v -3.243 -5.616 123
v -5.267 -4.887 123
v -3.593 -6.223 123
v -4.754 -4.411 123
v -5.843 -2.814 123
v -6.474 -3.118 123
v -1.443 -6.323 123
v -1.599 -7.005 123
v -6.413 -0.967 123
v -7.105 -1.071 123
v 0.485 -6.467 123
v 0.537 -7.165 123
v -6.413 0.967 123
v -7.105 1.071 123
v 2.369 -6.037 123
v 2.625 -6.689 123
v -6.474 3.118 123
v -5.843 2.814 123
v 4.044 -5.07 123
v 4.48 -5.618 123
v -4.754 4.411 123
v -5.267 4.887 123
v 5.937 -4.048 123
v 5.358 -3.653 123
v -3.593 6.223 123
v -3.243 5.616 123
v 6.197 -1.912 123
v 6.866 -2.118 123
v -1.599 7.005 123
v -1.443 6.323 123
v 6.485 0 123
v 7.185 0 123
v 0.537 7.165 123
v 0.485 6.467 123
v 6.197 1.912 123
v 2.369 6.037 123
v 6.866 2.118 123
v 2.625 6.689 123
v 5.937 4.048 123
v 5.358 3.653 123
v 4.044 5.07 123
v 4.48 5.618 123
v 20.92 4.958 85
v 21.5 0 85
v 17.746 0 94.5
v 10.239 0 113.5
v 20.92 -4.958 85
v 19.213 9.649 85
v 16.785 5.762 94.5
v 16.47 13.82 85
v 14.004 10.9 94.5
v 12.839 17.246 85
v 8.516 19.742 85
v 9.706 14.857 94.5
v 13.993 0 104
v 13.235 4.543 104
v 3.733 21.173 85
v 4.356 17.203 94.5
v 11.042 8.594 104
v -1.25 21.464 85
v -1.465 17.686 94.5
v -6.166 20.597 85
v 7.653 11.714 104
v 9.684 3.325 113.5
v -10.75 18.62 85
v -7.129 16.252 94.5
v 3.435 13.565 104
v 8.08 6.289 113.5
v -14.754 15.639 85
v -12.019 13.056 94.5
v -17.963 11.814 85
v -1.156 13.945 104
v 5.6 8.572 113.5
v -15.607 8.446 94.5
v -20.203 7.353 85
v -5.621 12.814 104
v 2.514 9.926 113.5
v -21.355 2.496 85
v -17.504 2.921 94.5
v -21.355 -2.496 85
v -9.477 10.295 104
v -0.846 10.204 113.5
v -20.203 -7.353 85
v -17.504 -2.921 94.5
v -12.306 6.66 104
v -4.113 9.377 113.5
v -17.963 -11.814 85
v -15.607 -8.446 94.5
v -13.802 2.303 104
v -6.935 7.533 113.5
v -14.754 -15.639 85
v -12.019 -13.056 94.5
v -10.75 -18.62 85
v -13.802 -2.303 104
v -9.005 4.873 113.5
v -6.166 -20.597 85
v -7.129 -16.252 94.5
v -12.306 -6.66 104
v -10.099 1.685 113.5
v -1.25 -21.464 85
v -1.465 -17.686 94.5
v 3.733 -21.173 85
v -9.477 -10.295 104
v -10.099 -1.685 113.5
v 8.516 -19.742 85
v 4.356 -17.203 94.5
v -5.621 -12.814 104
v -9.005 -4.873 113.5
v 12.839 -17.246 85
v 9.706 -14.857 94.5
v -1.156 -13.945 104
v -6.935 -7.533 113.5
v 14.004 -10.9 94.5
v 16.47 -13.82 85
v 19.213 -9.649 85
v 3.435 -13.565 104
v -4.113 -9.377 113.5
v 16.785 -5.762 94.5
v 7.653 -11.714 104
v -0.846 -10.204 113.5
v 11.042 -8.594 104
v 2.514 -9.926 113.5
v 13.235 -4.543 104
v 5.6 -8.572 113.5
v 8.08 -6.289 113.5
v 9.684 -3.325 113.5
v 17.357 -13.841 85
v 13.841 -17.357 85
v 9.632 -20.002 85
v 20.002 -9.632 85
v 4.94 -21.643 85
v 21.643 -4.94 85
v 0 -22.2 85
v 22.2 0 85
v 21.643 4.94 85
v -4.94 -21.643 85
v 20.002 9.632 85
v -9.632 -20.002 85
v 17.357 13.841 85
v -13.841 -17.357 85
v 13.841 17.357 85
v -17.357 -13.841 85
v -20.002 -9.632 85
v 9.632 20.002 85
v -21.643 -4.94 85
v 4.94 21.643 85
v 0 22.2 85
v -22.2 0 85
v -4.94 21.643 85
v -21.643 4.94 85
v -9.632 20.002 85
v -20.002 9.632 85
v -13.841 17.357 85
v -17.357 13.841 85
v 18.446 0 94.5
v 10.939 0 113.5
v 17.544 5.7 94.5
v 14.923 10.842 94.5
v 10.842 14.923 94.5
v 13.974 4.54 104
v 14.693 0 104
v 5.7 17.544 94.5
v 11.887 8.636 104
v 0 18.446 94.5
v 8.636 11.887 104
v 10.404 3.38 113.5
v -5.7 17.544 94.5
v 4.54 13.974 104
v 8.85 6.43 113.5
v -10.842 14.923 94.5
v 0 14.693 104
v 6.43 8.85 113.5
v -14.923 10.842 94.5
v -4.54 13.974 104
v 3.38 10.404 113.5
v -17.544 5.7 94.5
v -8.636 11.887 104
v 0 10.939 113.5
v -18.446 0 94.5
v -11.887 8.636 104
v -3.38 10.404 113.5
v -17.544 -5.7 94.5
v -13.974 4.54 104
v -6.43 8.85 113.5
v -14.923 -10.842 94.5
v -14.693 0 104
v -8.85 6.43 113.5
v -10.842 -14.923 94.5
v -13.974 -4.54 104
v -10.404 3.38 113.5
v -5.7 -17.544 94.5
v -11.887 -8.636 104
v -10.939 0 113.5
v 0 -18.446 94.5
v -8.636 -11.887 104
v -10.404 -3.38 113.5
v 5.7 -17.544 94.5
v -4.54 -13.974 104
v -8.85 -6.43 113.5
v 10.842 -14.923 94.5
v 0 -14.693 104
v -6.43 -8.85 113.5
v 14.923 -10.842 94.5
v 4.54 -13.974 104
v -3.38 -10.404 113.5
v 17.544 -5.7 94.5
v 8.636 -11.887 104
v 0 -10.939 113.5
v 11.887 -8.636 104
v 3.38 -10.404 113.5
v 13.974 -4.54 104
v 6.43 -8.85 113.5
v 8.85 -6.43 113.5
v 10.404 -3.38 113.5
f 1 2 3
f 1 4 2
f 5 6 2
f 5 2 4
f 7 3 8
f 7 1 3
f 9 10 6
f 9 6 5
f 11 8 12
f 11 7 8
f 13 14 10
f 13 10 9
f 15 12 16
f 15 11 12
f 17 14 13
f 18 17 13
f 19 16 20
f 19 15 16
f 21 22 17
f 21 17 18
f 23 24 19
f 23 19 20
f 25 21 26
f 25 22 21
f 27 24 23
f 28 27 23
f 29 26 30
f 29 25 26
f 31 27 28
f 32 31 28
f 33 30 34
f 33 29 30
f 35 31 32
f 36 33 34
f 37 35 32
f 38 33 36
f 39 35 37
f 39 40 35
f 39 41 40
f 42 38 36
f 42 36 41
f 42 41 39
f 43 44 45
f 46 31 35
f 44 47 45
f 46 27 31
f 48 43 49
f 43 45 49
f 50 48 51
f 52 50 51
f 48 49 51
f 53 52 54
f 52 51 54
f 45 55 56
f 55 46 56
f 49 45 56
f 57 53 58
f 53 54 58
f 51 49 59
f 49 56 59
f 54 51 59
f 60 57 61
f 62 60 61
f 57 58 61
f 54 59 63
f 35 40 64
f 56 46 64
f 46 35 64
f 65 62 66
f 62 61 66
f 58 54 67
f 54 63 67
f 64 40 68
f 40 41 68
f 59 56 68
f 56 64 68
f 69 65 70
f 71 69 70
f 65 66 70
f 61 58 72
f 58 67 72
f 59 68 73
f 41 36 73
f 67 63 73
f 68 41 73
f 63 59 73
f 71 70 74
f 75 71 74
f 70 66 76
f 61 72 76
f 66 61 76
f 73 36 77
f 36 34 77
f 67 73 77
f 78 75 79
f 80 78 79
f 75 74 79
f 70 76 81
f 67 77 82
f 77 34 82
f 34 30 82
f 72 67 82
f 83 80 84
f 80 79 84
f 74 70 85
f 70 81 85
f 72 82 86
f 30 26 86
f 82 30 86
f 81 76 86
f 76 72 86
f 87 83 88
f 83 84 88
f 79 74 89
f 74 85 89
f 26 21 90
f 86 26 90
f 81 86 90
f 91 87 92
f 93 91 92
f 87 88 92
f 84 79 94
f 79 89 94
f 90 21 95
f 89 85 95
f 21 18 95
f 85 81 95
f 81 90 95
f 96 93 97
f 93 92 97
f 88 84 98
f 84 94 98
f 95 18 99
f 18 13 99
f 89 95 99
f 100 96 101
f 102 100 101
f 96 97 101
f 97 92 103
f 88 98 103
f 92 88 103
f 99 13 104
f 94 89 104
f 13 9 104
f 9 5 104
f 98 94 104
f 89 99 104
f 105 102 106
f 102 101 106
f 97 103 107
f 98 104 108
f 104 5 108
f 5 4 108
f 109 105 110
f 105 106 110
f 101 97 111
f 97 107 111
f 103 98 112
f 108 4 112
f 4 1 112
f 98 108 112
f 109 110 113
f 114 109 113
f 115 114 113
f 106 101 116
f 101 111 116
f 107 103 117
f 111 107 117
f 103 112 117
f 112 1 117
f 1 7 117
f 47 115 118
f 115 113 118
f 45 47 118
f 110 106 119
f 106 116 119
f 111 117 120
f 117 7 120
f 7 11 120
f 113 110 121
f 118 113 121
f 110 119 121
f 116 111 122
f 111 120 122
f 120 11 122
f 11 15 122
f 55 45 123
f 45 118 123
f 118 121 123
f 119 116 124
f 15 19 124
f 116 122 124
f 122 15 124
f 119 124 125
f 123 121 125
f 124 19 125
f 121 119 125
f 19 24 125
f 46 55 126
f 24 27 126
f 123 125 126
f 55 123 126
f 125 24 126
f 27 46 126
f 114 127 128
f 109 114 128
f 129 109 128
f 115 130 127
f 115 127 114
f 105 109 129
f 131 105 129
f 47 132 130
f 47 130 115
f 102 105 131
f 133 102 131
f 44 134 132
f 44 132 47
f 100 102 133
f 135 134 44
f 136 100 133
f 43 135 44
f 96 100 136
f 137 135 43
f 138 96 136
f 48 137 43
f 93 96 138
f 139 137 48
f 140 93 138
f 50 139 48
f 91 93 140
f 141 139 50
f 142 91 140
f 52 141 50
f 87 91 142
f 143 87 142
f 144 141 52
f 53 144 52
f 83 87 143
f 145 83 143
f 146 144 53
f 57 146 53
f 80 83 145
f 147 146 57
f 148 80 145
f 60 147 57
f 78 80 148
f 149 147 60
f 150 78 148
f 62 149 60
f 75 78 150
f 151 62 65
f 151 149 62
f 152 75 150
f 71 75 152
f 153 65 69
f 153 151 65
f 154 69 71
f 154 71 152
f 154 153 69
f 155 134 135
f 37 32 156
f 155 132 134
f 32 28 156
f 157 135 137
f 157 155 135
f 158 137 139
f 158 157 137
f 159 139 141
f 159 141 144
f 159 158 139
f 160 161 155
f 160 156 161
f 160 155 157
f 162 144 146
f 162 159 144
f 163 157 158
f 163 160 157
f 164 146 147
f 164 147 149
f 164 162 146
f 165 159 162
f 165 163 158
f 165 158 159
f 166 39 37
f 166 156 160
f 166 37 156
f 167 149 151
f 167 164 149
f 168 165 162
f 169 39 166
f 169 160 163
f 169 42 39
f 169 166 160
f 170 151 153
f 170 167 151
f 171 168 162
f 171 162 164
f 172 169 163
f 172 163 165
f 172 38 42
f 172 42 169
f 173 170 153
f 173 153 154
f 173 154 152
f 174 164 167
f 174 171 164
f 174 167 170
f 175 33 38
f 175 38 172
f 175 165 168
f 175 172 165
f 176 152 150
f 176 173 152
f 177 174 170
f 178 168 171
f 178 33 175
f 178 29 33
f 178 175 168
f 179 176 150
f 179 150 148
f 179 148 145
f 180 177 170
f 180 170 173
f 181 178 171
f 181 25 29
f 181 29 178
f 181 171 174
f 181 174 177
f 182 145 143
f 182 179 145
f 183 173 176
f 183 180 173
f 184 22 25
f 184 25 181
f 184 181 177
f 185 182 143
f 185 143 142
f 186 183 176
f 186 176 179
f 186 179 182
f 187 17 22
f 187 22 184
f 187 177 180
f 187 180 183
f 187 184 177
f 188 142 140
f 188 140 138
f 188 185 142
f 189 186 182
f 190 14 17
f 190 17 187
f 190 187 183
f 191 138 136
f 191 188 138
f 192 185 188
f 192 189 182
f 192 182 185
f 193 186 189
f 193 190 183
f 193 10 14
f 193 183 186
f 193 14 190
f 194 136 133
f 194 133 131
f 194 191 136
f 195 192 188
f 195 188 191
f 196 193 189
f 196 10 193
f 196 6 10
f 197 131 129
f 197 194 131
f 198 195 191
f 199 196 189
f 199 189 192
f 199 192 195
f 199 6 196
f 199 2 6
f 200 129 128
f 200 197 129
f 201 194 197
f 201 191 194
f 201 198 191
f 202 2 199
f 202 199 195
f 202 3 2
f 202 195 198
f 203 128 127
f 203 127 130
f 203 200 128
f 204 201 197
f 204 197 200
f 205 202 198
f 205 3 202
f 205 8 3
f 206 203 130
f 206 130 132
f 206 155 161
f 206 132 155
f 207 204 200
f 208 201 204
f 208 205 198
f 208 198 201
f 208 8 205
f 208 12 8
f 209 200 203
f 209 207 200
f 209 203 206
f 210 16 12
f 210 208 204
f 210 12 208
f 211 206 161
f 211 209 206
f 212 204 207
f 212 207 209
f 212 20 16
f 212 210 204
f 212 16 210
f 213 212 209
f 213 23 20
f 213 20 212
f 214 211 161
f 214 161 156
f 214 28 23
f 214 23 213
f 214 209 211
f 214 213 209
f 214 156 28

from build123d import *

# Parameters (mm, degrees)
CYLINDER044_R     = 8
CYLINDER044_DEPTH = 3


with BuildPart() as cylinder044:
    # Cylinder044 → Cylinder044 (new body)
    with BuildSketch(Plane.XY.offset(123)):
        Circle(CYLINDER044_R)
    extrude(amount=CYLINDER044_DEPTH)


with BuildPart() as cone001:
    # Cone002 → Cone002 (revolve)
    with BuildSketch(Plane(origin=(0, 0, 75), x_dir=(1, 0, 0), z_dir=(0, -1, 0))):
        Polygon((0, 0), (21.5, 0), (5.3, 41), (0, 41), align=None)
    revolve(axis=Axis((0, 0, 75), (0, 0, 1)))


with BuildPart() as conical_section:
    # Cone001 → Cone001 (revolve)
    with BuildSketch(Plane(origin=(0, 0, 75), x_dir=(1, 0, 0), z_dir=(0, -1, 0))):
        Polygon((0, 0), (22.2, 0), (6, 41), (0, 41), align=None)
    revolve(axis=Axis((0, 0, 75), (0, 0, 1)))

    # Cut003: cut Cone001
    add(cone001.part, mode=Mode.SUBTRACT)


with BuildPart() as conical_section_1:
    # Cut003 placement: moved
    add(conical_section.part.moved(Location((0, 0, 10))))

    # Cut038: cut Cylinder044
    add(cylinder044.part, mode=Mode.SUBTRACT)


solid = conical_section_1.part
